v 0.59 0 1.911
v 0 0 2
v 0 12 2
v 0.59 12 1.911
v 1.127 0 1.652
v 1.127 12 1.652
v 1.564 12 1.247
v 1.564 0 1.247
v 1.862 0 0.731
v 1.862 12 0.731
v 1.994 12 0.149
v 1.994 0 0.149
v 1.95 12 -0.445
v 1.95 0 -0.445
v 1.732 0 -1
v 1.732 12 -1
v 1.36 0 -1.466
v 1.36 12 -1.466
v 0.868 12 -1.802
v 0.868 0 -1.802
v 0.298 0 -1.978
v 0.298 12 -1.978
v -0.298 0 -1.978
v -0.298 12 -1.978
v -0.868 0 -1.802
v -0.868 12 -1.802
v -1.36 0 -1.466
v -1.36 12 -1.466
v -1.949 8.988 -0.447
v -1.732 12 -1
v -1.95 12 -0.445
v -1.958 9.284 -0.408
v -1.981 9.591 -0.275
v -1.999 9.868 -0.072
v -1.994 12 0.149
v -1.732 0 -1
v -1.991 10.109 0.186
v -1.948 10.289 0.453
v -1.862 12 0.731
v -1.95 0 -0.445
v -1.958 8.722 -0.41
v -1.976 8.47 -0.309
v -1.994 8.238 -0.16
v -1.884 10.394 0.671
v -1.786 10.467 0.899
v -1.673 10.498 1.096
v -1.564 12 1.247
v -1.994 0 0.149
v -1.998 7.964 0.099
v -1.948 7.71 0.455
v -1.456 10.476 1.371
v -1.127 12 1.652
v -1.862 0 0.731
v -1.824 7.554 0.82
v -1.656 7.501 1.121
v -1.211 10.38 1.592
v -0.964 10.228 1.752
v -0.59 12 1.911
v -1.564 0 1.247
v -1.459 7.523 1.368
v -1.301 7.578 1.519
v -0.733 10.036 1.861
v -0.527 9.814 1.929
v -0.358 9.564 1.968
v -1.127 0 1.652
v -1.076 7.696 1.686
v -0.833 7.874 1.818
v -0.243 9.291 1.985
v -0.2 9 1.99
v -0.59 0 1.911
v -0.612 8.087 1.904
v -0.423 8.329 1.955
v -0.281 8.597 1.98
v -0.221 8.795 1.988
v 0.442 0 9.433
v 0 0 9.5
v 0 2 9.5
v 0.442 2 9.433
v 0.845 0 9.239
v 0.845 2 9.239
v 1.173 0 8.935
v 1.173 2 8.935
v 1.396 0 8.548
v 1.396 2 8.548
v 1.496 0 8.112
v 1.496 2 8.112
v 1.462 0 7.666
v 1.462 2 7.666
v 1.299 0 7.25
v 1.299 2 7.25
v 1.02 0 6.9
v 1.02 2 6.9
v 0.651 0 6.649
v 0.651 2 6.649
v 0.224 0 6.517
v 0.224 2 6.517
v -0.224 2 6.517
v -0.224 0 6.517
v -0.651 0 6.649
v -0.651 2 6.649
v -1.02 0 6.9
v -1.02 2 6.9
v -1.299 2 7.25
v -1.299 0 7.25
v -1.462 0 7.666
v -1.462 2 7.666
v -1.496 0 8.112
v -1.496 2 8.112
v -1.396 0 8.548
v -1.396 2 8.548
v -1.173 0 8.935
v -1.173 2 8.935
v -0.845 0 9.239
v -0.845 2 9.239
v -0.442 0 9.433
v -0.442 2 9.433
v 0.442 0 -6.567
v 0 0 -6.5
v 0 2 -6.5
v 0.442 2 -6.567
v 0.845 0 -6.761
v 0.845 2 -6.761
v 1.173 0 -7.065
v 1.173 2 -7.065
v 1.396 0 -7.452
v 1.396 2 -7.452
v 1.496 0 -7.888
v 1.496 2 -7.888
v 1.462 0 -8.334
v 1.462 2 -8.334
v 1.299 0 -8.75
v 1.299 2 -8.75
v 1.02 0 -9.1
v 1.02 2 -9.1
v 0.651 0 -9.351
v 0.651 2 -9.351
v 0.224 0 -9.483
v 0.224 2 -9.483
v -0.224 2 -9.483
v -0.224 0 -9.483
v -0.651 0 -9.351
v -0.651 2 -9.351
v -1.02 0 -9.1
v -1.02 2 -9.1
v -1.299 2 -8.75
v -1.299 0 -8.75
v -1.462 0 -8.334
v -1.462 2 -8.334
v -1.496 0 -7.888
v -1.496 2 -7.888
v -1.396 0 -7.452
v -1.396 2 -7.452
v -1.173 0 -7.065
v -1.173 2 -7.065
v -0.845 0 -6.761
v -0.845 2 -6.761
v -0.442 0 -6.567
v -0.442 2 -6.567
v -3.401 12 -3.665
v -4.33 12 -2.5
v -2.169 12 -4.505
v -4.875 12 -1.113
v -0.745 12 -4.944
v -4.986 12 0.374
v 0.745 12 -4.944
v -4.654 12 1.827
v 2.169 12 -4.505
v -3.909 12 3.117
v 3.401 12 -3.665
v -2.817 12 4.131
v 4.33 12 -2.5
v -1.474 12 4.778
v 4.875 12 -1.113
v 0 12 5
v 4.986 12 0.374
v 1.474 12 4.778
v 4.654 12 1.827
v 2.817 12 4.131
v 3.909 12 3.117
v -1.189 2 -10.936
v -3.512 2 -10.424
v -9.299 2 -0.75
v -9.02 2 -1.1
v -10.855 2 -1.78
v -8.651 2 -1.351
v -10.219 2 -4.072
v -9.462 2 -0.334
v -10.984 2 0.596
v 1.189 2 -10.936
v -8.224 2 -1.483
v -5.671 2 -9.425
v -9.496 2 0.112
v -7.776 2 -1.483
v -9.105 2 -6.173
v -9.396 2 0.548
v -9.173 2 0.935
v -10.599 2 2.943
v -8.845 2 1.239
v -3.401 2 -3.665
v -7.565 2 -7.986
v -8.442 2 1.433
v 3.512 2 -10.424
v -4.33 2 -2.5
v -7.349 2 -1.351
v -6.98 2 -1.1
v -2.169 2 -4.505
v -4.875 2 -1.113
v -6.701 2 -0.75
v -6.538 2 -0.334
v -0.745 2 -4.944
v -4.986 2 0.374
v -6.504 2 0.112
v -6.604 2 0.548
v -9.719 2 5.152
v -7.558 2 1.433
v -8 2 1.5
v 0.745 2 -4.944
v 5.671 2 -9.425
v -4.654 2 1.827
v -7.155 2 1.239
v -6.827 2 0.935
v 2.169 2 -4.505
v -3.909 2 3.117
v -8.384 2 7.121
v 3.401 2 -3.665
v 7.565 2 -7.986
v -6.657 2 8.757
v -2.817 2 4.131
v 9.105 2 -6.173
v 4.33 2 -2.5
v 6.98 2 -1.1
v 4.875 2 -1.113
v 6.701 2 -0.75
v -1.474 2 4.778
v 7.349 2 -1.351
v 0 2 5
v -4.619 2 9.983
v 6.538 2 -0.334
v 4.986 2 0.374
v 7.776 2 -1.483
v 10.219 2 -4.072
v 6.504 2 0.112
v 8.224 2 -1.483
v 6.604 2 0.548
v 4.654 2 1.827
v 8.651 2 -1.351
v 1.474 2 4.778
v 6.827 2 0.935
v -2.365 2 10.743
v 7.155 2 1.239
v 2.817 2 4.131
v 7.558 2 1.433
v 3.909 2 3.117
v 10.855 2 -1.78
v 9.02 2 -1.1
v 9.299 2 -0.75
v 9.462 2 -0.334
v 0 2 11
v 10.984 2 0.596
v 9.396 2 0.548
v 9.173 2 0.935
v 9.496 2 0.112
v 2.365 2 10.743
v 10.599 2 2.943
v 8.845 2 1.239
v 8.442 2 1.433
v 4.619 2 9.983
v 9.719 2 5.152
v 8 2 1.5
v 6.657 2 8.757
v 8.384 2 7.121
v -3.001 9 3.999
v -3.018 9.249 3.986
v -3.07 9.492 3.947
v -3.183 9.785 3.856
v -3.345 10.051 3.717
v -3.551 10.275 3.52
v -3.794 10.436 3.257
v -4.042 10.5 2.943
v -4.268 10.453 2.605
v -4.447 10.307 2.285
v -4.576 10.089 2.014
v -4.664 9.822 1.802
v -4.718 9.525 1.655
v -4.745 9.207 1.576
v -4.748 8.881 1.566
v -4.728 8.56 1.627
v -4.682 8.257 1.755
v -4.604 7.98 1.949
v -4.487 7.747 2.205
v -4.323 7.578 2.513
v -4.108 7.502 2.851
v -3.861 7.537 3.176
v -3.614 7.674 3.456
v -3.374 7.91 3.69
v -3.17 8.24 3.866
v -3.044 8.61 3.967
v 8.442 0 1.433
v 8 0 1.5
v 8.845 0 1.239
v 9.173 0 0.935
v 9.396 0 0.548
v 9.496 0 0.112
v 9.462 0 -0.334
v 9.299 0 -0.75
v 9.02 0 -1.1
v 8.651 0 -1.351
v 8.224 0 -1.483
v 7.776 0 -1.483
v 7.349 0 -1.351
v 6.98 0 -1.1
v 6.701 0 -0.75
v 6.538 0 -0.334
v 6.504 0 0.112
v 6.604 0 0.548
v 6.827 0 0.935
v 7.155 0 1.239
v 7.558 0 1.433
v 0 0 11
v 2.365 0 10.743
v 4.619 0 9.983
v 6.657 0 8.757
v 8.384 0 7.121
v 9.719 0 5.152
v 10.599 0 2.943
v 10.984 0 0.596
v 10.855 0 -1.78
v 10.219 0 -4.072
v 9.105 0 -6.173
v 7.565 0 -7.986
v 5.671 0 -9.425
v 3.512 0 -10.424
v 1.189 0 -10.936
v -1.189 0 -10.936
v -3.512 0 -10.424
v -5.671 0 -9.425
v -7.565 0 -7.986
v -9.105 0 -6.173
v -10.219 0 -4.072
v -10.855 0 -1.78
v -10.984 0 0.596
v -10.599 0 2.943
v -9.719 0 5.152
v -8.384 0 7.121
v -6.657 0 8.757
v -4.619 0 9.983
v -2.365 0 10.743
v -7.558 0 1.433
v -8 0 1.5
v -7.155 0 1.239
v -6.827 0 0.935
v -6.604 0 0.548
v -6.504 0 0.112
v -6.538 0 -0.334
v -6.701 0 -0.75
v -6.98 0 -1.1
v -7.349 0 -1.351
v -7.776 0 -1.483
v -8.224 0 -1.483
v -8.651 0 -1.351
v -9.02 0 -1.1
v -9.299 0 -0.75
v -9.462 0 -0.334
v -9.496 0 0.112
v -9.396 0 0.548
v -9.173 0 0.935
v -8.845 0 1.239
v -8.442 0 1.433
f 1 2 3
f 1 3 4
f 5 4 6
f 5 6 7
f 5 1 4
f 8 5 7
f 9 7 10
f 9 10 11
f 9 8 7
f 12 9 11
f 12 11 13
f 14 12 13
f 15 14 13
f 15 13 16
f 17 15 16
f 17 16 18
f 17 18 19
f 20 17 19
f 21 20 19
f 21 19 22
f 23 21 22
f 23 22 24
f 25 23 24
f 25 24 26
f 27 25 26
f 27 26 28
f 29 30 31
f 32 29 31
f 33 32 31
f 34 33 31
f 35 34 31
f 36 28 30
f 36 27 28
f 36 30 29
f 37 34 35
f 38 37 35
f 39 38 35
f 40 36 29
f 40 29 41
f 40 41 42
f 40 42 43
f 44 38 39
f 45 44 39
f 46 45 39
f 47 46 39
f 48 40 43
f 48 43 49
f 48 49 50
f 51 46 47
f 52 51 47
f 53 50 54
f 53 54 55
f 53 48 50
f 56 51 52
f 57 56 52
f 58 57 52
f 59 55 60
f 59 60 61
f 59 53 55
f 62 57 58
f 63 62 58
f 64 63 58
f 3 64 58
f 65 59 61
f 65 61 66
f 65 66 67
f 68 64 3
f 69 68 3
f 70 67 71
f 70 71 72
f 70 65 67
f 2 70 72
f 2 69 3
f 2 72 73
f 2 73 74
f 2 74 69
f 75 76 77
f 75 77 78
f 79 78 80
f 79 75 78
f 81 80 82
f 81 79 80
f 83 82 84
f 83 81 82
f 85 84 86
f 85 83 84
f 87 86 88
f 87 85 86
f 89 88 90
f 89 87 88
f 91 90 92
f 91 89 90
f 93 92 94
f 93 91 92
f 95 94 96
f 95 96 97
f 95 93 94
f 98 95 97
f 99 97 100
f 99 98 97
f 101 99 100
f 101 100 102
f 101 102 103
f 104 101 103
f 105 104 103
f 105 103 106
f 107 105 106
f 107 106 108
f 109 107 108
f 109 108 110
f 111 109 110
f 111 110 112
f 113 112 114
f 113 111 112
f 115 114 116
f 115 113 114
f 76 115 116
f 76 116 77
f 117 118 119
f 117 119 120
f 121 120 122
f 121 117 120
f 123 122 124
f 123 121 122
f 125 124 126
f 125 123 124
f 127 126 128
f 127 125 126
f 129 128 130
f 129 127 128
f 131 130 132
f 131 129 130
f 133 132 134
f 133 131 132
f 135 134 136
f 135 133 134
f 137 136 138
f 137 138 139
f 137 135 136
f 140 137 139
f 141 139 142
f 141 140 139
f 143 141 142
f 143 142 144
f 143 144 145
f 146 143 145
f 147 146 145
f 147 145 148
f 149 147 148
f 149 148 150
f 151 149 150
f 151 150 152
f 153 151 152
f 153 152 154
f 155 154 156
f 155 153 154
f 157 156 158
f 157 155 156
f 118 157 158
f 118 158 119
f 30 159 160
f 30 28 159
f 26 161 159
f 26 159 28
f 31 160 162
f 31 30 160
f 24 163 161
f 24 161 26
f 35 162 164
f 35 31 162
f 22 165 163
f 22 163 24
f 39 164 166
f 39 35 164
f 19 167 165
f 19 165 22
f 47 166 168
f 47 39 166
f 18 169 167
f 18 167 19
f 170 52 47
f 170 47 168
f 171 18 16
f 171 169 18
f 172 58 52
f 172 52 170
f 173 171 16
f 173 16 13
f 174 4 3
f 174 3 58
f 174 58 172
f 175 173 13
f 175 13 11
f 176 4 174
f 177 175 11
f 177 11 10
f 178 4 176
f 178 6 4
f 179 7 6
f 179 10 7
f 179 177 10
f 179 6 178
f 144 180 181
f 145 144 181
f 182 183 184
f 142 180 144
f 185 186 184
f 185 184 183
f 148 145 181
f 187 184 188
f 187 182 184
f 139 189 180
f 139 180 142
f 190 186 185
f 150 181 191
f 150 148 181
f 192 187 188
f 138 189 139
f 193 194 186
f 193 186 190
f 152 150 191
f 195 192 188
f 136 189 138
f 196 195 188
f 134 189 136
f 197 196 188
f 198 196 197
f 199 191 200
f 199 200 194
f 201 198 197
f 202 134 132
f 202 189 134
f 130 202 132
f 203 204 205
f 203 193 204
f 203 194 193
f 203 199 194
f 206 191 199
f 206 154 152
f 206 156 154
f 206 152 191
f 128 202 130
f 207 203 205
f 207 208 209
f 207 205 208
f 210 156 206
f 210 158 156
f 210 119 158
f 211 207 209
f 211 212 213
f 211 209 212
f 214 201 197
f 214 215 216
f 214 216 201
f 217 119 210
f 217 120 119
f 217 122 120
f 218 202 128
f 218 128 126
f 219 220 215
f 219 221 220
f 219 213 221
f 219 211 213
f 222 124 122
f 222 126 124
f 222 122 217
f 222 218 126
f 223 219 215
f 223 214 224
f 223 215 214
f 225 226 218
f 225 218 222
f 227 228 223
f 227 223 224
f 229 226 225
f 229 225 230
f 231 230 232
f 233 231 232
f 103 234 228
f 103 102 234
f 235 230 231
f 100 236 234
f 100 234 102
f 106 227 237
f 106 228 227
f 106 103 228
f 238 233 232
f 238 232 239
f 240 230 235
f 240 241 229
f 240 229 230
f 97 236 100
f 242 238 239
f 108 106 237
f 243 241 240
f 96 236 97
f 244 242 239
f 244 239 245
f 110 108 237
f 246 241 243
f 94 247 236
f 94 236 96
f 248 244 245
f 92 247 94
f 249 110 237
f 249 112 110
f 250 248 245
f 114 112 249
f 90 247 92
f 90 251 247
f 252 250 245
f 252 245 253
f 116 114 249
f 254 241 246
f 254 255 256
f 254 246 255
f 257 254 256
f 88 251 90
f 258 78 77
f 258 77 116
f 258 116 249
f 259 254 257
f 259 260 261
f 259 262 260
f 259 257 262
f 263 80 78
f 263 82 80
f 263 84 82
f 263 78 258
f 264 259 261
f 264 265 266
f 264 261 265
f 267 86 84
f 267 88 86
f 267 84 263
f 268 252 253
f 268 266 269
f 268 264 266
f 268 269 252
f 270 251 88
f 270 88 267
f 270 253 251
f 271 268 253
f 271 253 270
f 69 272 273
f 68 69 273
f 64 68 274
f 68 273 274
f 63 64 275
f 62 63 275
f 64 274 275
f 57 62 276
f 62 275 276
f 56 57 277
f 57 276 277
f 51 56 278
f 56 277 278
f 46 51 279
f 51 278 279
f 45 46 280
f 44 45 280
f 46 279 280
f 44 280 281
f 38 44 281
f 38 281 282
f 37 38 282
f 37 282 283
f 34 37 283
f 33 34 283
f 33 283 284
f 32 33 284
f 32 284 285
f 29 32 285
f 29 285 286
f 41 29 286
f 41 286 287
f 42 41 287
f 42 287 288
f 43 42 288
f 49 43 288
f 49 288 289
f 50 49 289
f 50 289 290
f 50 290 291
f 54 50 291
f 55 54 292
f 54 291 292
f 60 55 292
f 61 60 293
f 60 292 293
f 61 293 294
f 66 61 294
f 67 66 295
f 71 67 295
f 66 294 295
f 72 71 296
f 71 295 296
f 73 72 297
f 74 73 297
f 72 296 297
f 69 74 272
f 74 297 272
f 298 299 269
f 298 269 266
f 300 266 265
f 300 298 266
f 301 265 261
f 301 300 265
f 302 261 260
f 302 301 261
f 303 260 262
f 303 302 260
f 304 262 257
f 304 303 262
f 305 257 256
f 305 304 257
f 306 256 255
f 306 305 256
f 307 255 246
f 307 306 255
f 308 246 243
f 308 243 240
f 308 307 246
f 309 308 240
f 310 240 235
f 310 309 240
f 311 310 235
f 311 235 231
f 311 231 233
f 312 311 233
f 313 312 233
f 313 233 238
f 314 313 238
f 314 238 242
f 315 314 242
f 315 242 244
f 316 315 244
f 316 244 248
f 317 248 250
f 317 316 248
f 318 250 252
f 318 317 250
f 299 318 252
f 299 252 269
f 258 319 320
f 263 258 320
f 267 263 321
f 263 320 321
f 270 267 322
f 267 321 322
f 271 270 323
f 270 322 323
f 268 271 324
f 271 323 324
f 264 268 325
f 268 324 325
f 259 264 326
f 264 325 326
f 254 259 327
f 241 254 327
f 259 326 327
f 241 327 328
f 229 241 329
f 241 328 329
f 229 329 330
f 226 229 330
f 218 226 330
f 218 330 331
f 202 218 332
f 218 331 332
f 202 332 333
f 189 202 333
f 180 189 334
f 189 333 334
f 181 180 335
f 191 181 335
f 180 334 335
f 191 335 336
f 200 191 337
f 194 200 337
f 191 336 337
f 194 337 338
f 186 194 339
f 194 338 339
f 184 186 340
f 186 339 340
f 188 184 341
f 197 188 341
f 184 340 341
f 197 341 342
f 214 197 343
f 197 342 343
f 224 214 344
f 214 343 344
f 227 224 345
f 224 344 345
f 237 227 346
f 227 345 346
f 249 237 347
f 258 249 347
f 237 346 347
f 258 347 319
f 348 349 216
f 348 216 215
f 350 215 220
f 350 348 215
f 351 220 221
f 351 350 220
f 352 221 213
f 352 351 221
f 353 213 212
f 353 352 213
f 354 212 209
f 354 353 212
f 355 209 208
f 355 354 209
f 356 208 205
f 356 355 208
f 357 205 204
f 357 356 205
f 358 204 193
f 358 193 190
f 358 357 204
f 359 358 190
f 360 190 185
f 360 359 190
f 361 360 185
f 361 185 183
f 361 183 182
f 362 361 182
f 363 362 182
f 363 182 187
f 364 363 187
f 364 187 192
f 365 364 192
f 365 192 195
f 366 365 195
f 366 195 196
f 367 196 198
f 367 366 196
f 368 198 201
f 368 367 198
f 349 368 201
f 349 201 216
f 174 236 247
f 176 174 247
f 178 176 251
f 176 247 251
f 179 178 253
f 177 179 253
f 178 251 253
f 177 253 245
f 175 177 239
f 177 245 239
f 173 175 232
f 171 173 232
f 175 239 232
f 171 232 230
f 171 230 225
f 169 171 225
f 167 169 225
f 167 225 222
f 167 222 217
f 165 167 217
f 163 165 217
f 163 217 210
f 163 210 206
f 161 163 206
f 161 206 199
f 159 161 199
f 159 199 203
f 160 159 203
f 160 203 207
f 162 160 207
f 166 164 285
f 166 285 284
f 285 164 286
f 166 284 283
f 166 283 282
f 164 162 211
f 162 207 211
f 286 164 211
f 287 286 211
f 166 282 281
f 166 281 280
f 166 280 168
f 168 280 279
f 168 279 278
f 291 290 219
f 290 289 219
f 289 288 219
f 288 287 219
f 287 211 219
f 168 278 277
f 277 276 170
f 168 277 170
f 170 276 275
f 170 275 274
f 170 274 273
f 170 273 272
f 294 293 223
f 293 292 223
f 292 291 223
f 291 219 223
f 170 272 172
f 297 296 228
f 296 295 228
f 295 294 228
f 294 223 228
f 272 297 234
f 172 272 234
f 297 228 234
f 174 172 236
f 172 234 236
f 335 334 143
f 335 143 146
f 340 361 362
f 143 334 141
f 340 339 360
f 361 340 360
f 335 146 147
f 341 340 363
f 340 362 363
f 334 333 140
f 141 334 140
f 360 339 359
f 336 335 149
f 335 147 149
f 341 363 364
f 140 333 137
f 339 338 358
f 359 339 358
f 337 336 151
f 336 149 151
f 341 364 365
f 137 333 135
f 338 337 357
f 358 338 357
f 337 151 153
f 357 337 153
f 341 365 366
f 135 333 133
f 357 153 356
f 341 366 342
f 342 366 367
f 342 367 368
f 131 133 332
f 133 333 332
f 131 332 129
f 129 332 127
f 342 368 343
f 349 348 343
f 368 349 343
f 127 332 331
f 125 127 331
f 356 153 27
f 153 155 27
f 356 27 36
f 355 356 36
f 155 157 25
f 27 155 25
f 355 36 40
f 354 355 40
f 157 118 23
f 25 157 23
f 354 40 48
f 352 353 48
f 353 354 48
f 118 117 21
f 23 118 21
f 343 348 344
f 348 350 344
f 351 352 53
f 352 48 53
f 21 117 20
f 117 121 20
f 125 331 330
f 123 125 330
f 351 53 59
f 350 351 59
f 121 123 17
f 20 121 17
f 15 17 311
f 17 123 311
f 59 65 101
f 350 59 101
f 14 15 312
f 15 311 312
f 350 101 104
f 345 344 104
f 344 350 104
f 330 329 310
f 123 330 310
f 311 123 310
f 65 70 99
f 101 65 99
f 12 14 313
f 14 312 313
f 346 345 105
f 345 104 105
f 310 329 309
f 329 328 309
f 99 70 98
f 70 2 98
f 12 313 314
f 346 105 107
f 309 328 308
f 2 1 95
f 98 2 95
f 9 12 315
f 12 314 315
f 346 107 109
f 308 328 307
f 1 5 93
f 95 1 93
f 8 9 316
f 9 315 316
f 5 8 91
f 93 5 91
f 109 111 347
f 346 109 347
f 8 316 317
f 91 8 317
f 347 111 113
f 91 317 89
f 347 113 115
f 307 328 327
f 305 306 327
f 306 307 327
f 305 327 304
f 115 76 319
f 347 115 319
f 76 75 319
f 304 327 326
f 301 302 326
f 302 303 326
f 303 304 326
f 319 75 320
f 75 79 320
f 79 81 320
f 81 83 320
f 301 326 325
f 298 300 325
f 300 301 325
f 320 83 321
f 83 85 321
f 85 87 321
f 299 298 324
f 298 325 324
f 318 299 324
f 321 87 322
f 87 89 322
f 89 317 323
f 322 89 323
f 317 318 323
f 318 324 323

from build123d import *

# Parameters (mm, degrees)
SKETCH1_R               = 11
SKETCH1_R_2             = 1.5
SKETCH1_R_3             = 5
BOSS_EXTRUDE1_DEPTH     = 2
SKETCH1_3_R             = 5
SKETCH1_3_R_2           = 2
BOSS_EXTRUDE2_DEPTH     = 12
CUT_EXTRUDE1_REACH      = 25.759
CUT_EXTRUDE1_END_RADIUS = 2
SKETCH2_R               = 1.5


with BuildPart() as part:
    # Sketch1 → Boss-Extrude1 (new body)
    with BuildSketch(Plane(origin=(0, 0, 0), x_dir=(1, 0, 0), z_dir=(0, 1, 0))):
        Circle(SKETCH1_R)
        with Locations((-8, 0)):
            Circle(SKETCH1_R_2, mode=Mode.SUBTRACT)
        with Locations((0, -8)):
            Circle(SKETCH1_R_2, mode=Mode.SUBTRACT)
        Circle(SKETCH1_R_3, mode=Mode.SUBTRACT)
        with Locations((8, 0)):
            Circle(SKETCH1_R_2, mode=Mode.SUBTRACT)
        with Locations((0, 8)):
            Circle(SKETCH1_R_2, mode=Mode.SUBTRACT)
    extrude(amount=BOSS_EXTRUDE1_DEPTH)

    # Sketch1<3> → Boss-Extrude2 (add)
    with BuildSketch(Plane(origin=(0, 0, 0), x_dir=(1, 0, 0), z_dir=(0, 1, 0))):
        Circle(SKETCH1_3_R)
        Circle(SKETCH1_3_R_2, mode=Mode.SUBTRACT)
    extrude(amount=BOSS_EXTRUDE2_DEPTH)

    # Cut-Extrude1: up to this cylinder (the profile starts outside it)
    cut_extrude1_end = Plane(origin=(0, 9, 0), z_dir=(0, -1, 0)) * Cylinder(CUT_EXTRUDE1_END_RADIUS, 56.518, mode=Mode.PRIVATE)
    # Sketch2 → Cut-Extrude1 (cut, up to the surface)
    with BuildSketch(Plane(origin=(-4.0625, 0, 2.914805954), x_dir=(0.582961190817979, 0, 0.8125000000000517), z_dir=(-0.8125000000000517, 0, 0.582961190817979)), mode=Mode.PRIVATE) as cut_extrude1_sk1:
        with Locations((0, 9)):
            Circle(SKETCH2_R)
    cut_extrude1_tool1 = extrude(cut_extrude1_sk1.sketch, amount=-CUT_EXTRUDE1_REACH, mode=Mode.PRIVATE) - cut_extrude1_end
    add(cut_extrude1_tool1.solids().sort_by_distance((-4.0625, 9, 2.914806))[0], mode=Mode.SUBTRACT)


solid = part.part
